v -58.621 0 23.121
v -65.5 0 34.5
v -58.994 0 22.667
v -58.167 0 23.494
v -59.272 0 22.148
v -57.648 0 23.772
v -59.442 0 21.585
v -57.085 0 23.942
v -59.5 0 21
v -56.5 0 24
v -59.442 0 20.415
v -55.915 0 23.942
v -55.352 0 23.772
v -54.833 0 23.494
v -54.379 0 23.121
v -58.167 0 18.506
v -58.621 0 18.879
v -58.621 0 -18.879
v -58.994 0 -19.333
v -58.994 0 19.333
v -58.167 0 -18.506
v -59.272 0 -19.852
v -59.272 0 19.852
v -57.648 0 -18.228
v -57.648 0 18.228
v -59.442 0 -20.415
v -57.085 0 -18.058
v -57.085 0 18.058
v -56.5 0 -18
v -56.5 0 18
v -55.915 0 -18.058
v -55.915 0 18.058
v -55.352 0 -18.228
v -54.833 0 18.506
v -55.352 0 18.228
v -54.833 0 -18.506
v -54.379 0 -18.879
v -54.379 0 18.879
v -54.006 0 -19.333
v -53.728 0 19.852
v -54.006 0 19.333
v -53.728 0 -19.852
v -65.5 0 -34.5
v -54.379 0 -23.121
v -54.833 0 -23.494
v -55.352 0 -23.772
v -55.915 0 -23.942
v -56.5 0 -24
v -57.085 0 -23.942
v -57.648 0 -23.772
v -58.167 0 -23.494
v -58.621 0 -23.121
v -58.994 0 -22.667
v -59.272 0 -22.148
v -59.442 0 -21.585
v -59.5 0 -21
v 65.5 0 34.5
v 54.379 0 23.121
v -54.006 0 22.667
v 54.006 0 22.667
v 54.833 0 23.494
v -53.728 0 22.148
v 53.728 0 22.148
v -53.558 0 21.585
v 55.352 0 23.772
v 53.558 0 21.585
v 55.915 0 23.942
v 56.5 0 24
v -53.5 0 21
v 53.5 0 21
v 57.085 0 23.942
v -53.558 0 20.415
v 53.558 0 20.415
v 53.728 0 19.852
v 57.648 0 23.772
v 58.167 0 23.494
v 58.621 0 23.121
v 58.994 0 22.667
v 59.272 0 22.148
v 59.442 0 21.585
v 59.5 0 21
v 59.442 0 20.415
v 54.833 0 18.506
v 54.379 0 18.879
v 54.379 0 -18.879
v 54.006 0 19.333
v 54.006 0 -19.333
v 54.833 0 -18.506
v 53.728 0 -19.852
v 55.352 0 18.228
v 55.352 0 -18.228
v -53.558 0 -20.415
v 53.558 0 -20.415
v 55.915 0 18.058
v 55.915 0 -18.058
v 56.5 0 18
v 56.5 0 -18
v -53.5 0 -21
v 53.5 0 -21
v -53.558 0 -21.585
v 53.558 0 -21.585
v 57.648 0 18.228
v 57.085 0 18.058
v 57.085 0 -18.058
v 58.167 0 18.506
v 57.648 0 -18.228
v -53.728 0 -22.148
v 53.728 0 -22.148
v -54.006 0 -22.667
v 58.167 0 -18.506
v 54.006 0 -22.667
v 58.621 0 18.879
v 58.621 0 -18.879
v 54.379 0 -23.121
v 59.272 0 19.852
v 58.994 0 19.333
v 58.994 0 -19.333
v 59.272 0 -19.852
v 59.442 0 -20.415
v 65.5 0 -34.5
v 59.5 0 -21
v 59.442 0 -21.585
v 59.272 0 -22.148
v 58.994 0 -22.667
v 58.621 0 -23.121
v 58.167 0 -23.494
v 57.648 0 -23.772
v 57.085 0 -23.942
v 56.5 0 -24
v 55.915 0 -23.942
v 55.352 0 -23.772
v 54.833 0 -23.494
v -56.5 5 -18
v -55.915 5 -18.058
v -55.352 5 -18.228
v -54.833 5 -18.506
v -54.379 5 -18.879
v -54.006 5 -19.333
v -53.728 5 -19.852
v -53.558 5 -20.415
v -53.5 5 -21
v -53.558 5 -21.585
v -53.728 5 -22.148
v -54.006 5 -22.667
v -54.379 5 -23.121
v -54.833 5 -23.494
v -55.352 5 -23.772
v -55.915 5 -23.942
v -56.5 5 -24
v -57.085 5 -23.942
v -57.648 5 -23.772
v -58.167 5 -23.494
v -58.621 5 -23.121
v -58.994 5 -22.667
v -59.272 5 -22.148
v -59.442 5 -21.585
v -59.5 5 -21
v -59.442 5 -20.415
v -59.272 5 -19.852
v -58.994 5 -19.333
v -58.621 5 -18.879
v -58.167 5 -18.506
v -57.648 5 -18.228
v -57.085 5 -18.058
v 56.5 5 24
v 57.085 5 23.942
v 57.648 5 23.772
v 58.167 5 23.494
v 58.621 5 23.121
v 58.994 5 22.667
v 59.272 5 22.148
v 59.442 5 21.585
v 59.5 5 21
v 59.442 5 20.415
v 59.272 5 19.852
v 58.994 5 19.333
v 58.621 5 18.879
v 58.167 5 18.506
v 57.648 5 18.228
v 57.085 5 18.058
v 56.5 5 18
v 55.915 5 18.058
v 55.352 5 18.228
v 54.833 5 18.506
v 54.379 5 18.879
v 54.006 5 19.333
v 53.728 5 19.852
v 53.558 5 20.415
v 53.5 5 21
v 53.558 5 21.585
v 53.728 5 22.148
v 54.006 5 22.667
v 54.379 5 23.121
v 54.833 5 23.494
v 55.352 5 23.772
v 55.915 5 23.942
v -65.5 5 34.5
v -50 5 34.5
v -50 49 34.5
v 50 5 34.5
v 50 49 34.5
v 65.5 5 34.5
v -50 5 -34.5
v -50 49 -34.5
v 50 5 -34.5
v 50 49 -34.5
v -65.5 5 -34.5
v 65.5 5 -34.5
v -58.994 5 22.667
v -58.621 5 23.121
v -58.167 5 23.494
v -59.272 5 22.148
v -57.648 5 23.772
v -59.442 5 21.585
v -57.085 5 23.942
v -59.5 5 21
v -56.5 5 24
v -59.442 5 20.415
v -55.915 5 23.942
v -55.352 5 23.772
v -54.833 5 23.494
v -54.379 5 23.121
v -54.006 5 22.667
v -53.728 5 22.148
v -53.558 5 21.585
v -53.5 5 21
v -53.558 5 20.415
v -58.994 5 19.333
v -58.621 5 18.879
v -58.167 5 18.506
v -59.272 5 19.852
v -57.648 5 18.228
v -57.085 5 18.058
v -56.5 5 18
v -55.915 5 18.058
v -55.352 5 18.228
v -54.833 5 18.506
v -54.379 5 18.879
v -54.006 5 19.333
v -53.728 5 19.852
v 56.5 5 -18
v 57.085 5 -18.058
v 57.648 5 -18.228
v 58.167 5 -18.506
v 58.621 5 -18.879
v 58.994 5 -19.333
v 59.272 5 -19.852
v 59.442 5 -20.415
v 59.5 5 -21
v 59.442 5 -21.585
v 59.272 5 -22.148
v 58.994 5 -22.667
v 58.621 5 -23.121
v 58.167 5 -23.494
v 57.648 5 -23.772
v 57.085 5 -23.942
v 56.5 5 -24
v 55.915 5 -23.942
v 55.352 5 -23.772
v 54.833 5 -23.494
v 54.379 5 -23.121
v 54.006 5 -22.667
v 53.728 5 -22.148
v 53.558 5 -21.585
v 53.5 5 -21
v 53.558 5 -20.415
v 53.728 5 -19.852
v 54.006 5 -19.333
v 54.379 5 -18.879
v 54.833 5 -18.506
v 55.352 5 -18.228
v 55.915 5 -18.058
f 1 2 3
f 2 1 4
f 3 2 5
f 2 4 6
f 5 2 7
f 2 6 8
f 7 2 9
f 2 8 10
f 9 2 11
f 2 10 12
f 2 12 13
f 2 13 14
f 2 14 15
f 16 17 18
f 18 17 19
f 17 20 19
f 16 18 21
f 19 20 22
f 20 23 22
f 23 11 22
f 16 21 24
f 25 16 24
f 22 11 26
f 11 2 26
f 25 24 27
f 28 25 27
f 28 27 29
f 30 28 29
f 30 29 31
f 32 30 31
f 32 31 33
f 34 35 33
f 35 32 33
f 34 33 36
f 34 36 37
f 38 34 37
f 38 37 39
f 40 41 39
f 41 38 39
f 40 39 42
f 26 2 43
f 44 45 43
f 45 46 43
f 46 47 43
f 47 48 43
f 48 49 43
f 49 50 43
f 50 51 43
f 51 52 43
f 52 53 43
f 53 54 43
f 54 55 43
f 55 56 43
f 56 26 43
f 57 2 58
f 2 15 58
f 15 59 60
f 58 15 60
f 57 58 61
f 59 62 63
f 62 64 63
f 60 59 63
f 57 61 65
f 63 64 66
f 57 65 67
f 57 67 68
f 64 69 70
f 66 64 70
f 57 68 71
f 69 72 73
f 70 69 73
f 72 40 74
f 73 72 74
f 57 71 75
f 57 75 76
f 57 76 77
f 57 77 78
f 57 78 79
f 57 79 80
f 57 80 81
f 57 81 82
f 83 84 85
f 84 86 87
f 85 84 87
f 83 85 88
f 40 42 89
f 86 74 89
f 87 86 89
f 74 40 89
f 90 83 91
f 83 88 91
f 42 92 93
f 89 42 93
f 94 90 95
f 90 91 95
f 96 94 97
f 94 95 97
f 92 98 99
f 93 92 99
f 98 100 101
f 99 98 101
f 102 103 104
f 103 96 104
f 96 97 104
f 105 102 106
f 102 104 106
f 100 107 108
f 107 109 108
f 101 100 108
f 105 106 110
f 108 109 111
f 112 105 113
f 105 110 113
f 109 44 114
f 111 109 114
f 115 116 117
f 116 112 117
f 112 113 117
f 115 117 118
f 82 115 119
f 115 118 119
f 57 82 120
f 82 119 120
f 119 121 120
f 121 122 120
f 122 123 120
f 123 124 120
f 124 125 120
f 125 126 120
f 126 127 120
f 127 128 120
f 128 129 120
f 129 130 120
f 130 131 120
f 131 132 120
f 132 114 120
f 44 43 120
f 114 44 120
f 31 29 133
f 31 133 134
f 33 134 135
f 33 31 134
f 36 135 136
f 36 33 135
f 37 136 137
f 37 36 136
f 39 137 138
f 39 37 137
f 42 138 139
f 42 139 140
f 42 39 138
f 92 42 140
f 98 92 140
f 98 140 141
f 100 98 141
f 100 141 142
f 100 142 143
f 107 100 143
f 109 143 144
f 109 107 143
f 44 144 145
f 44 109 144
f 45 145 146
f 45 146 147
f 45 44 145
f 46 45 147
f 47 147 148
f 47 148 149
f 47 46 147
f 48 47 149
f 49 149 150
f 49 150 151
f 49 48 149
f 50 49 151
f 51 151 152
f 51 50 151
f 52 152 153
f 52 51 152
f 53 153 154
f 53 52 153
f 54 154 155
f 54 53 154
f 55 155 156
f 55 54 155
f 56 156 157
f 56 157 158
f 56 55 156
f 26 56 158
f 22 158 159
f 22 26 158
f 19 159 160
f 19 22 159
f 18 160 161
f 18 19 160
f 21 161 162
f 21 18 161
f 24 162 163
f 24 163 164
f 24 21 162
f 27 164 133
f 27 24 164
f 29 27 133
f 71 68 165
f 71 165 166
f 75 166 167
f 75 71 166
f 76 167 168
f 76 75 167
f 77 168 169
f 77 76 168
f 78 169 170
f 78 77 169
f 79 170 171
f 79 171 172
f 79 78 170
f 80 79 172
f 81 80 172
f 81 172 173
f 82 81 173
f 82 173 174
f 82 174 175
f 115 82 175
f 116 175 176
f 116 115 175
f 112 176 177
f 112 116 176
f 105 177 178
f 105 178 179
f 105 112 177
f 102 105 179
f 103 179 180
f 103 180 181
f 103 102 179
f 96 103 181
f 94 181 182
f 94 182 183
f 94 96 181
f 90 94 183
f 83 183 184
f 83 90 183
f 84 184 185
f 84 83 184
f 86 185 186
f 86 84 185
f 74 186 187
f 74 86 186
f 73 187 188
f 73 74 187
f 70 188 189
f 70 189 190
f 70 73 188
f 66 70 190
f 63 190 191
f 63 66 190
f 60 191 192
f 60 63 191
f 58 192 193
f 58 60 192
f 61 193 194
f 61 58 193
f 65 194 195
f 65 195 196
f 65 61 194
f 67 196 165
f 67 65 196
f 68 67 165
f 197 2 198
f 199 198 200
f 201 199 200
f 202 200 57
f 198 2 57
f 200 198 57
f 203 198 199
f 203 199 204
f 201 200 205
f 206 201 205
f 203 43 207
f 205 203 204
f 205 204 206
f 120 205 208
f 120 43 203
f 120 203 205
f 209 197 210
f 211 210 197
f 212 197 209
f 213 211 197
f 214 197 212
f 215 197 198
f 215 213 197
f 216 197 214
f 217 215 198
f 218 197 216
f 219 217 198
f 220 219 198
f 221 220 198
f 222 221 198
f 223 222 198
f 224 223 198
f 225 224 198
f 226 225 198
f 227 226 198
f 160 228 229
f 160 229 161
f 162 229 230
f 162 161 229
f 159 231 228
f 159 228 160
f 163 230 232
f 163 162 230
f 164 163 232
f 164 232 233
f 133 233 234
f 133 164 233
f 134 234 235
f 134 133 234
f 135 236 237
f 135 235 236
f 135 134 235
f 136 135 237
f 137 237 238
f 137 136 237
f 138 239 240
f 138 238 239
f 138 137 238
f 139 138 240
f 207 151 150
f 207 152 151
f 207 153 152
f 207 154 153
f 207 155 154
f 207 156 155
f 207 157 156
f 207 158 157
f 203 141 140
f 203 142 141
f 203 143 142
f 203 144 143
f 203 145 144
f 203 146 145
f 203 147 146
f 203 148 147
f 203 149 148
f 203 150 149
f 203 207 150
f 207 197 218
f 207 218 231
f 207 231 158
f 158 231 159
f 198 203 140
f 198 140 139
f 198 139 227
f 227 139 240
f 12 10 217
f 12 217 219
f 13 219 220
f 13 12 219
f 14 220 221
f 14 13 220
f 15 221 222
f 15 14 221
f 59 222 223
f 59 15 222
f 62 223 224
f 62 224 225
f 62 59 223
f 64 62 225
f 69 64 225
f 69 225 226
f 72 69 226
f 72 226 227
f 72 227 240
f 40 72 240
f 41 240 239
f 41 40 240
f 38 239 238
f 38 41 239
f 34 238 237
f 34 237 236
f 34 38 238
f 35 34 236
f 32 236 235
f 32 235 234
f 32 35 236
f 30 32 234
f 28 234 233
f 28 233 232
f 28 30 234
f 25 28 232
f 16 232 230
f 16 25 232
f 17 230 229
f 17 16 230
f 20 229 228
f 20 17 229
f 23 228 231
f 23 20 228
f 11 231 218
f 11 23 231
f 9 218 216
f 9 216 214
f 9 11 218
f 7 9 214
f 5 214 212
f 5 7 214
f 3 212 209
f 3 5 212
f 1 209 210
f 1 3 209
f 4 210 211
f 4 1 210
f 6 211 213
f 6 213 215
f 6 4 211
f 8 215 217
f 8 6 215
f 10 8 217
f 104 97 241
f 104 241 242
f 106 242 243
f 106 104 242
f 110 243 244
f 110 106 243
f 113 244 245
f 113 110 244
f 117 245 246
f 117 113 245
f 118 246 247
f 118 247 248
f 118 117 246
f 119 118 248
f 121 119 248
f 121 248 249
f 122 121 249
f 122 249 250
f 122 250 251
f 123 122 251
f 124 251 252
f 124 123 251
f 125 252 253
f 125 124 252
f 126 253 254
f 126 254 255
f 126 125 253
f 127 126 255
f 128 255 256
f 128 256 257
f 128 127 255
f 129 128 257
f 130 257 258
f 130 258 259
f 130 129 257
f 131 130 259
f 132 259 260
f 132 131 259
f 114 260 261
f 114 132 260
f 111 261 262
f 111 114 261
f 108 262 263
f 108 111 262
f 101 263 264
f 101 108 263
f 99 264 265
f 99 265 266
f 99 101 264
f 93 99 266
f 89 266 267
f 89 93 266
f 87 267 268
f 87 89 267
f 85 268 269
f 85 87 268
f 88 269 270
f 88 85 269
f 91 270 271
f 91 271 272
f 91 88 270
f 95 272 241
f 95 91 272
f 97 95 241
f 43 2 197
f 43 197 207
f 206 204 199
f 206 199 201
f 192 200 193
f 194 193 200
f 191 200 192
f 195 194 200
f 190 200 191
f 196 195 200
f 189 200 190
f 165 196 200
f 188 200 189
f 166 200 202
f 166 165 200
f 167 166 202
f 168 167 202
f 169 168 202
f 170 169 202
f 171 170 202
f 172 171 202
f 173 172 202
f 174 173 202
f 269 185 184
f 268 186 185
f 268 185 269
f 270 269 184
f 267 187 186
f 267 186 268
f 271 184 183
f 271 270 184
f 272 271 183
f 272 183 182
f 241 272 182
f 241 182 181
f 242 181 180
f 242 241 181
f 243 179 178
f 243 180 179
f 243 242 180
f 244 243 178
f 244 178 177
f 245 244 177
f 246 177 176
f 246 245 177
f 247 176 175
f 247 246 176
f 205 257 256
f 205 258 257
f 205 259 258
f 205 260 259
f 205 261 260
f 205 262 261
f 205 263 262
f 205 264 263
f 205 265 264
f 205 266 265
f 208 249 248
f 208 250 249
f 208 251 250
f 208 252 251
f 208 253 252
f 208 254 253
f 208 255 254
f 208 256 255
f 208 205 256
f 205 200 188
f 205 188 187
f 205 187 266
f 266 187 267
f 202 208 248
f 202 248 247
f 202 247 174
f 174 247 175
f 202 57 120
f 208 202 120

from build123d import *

# Parameters (mm, degrees)
SKETCH_1_W        = 15.5
SKETCH_1_H        = 69
SKETCH_1_R        = 3
EXTRUDE_1_DEPTH   = 5
EXTRUDE_1_2_DEPTH = 5
SKETCH_1_3_W      = 100
SKETCH_1_3_H      = 69
EXTRUDE_2_DEPTH   = 49


with BuildPart() as part:
    # 草图1 → 凸台-拉伸1 (new body)
    with BuildSketch(Plane(origin=(0, 0, 0), x_dir=(1, 0, 0), z_dir=(0, 1, 0))):
        with Locations((-57.75, 0)):
            Rectangle(SKETCH_1_W, SKETCH_1_H)
        with Locations((-56.5, -21)):
            Circle(SKETCH_1_R, mode=Mode.SUBTRACT)
        with Locations((-56.5, 21)):
            Circle(SKETCH_1_R, mode=Mode.SUBTRACT)
    extrude(amount=EXTRUDE_1_DEPTH)



with BuildPart() as body_2:
    # 草图1 → Extrude 1 2 (new body)
    with BuildSketch(Plane(origin=(0, 0, 0), x_dir=(1, 0, 0), z_dir=(0, 1, 0))):
        with Locations((57.75, 0)):
            Rectangle(SKETCH_1_W, SKETCH_1_H)
        with Locations((56.5, -21)):
            Circle(SKETCH_1_R, mode=Mode.SUBTRACT)
        with Locations((56.5, 21)):
            Circle(SKETCH_1_R, mode=Mode.SUBTRACT)
    extrude(amount=EXTRUDE_1_2_DEPTH)


with BuildPart() as part_1:
    add(part.part)

    add(body_2.part)  # 凸台-拉伸2 merges body 2
    # 草图1<3> → 凸台-拉伸2 (add)
    with BuildSketch(Plane(origin=(0, 0, 0), x_dir=(1, 0, 0), z_dir=(0, 1, 0))):
        Rectangle(SKETCH_1_3_W, SKETCH_1_3_H)
    extrude(amount=EXTRUDE_2_DEPTH)


solid = part_1.part
